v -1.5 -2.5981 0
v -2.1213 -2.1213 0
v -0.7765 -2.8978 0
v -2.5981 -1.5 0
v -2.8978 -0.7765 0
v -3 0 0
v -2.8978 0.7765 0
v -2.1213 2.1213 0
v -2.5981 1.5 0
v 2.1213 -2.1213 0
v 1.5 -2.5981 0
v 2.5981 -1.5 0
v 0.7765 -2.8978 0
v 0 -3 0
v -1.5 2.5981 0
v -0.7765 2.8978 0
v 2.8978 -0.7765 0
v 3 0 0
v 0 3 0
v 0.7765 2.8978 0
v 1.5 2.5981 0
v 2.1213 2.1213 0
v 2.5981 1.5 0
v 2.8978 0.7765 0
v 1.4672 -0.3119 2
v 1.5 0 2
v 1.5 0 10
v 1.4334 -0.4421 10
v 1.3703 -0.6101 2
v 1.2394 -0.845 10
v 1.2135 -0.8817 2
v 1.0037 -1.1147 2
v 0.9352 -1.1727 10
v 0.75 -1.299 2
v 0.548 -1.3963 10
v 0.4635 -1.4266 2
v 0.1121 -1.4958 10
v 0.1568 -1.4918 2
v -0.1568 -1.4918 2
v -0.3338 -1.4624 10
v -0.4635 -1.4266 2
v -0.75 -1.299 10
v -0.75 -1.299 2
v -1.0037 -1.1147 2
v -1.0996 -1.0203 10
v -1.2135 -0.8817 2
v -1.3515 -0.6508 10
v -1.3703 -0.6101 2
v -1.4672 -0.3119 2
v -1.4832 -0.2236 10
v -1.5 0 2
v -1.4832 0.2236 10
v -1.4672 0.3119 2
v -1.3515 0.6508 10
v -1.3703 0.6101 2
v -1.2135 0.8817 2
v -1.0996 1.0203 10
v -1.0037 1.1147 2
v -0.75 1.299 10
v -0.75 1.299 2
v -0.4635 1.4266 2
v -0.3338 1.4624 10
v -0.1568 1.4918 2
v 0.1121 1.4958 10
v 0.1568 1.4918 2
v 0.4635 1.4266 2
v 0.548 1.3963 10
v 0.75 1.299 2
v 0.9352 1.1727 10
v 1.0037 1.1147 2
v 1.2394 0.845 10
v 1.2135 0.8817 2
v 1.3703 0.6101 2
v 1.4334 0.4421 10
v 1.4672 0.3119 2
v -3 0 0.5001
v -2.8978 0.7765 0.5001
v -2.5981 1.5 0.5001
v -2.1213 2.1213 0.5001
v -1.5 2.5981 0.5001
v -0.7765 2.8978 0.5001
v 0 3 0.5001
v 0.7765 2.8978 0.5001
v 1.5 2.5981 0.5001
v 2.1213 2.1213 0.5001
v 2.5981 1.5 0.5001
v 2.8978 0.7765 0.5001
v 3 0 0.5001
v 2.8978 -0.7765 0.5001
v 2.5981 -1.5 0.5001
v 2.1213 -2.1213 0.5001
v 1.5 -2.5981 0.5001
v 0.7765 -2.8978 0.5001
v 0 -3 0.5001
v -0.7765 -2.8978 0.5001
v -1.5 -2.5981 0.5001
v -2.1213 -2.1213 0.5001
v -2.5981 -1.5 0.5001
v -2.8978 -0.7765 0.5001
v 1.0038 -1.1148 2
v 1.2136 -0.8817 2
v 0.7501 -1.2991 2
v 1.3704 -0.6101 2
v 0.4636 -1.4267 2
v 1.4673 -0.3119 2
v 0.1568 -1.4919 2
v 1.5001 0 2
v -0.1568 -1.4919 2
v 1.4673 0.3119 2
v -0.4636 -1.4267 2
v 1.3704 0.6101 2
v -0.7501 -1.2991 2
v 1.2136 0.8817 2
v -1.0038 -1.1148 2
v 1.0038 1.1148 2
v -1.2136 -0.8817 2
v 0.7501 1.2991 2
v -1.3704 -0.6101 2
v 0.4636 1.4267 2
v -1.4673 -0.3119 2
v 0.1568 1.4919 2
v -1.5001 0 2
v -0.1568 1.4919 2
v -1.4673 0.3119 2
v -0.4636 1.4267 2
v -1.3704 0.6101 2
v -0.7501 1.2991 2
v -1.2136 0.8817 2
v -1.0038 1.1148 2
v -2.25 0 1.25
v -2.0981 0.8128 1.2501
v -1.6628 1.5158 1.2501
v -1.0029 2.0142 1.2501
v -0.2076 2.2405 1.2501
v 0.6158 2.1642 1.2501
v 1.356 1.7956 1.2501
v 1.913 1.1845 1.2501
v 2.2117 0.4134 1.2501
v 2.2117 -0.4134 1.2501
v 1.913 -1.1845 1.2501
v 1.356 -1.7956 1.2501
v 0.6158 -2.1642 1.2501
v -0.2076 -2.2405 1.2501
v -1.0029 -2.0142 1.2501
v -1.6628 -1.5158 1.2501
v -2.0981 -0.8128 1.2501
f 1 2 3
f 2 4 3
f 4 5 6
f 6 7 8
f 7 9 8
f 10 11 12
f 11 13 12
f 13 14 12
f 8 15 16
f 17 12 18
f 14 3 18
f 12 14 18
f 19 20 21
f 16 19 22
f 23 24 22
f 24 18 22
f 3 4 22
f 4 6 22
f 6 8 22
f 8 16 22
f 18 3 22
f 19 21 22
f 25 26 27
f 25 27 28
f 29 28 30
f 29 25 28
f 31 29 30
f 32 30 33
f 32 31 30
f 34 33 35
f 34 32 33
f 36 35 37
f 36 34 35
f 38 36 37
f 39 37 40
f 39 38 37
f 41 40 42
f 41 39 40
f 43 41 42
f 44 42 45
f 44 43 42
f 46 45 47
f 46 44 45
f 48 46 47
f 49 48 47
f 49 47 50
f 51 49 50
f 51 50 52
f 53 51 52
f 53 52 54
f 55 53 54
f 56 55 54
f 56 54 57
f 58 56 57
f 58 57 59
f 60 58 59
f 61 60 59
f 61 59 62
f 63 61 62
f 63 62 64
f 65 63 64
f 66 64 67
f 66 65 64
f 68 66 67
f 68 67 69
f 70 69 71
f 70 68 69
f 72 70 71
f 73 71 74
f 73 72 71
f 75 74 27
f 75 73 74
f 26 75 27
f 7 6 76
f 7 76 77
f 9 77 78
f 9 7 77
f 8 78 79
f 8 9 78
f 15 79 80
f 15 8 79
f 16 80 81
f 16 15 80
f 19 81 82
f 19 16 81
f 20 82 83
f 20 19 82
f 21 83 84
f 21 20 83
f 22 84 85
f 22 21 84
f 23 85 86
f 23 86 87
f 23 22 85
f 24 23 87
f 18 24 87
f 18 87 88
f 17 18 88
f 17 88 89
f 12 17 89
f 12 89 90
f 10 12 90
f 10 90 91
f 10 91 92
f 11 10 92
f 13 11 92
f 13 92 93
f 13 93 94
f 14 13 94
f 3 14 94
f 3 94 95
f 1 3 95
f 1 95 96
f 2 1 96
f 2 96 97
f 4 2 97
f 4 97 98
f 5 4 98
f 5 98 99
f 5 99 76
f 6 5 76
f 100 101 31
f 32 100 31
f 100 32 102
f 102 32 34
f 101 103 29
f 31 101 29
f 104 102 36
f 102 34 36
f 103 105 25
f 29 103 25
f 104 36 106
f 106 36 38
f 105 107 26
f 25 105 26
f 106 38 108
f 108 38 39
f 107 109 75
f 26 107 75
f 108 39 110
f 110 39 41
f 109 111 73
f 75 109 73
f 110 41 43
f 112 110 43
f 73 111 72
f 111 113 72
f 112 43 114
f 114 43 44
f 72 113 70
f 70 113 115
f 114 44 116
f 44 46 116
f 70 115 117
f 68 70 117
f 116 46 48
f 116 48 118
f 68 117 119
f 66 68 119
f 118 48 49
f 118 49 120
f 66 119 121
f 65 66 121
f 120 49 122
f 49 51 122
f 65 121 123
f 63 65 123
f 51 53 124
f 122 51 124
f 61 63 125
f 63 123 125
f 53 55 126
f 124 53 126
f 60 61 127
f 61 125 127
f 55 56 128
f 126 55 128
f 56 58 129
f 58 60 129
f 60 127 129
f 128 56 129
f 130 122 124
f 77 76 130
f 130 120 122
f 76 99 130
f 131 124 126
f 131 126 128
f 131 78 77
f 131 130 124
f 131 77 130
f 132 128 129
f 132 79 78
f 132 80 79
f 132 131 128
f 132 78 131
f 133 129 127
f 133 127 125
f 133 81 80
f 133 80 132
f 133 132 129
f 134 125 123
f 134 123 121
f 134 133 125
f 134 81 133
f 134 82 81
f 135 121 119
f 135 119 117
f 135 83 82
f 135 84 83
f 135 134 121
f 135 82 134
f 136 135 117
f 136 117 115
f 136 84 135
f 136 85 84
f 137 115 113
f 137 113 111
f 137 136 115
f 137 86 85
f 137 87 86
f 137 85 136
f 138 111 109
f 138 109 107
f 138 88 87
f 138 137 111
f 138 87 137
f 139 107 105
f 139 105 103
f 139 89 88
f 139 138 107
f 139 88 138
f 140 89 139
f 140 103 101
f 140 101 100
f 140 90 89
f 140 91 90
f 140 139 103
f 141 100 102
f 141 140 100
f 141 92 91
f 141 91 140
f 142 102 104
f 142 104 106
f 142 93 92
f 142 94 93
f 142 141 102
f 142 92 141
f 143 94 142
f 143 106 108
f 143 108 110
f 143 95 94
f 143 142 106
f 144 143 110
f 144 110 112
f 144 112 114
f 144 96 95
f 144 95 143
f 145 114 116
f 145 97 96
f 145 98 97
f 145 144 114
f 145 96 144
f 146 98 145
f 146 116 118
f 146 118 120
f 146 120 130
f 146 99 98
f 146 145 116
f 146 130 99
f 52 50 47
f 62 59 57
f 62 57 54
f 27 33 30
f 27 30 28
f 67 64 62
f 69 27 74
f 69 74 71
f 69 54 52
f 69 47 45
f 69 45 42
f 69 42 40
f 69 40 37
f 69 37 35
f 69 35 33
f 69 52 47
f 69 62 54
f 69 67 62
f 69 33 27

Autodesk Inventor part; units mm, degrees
ref_plane "YZ Plane" through (0, 0, 0) normal (1, 0, 0) x (0, 1, 0)
ref_plane "XZ Plane" through (0, 0, 0) normal (0, 1, 0) x (-1, 0, 0)
ref_plane "XY Plane" through (0, 0, 0) normal (0, 0, 1) x (1, 0, 0)
sketch "スケッチ1" plane through (0, 0, 0) normal (0, 0, 1) x (1, 0, 0)
  circle A0 centre (0, 0) radius 1.5
  dimension "d0" = 3
extrude "押し出し1" add sketch "スケッチ1" along normal blind 10
sketch "スケッチ2" plane through (0, 0, 0) normal (0, 0, -1) x (-1, 0, 0)
  circle A0 centre (0, 0) radius 3
  dimension "d3" = 6
extrude "押し出し2" add sketch "スケッチ2" against normal blind 2
thread "ねじ1" size "M3x0.5" class "6g" standard "ANSI Metric M Profile" full length
chamfer "面取り1" distance 1.5 angle 45 1 edges at (3, 0, 2)
properties part number "ネジ皿m3,10" material "鋼、高強度、低合金"
